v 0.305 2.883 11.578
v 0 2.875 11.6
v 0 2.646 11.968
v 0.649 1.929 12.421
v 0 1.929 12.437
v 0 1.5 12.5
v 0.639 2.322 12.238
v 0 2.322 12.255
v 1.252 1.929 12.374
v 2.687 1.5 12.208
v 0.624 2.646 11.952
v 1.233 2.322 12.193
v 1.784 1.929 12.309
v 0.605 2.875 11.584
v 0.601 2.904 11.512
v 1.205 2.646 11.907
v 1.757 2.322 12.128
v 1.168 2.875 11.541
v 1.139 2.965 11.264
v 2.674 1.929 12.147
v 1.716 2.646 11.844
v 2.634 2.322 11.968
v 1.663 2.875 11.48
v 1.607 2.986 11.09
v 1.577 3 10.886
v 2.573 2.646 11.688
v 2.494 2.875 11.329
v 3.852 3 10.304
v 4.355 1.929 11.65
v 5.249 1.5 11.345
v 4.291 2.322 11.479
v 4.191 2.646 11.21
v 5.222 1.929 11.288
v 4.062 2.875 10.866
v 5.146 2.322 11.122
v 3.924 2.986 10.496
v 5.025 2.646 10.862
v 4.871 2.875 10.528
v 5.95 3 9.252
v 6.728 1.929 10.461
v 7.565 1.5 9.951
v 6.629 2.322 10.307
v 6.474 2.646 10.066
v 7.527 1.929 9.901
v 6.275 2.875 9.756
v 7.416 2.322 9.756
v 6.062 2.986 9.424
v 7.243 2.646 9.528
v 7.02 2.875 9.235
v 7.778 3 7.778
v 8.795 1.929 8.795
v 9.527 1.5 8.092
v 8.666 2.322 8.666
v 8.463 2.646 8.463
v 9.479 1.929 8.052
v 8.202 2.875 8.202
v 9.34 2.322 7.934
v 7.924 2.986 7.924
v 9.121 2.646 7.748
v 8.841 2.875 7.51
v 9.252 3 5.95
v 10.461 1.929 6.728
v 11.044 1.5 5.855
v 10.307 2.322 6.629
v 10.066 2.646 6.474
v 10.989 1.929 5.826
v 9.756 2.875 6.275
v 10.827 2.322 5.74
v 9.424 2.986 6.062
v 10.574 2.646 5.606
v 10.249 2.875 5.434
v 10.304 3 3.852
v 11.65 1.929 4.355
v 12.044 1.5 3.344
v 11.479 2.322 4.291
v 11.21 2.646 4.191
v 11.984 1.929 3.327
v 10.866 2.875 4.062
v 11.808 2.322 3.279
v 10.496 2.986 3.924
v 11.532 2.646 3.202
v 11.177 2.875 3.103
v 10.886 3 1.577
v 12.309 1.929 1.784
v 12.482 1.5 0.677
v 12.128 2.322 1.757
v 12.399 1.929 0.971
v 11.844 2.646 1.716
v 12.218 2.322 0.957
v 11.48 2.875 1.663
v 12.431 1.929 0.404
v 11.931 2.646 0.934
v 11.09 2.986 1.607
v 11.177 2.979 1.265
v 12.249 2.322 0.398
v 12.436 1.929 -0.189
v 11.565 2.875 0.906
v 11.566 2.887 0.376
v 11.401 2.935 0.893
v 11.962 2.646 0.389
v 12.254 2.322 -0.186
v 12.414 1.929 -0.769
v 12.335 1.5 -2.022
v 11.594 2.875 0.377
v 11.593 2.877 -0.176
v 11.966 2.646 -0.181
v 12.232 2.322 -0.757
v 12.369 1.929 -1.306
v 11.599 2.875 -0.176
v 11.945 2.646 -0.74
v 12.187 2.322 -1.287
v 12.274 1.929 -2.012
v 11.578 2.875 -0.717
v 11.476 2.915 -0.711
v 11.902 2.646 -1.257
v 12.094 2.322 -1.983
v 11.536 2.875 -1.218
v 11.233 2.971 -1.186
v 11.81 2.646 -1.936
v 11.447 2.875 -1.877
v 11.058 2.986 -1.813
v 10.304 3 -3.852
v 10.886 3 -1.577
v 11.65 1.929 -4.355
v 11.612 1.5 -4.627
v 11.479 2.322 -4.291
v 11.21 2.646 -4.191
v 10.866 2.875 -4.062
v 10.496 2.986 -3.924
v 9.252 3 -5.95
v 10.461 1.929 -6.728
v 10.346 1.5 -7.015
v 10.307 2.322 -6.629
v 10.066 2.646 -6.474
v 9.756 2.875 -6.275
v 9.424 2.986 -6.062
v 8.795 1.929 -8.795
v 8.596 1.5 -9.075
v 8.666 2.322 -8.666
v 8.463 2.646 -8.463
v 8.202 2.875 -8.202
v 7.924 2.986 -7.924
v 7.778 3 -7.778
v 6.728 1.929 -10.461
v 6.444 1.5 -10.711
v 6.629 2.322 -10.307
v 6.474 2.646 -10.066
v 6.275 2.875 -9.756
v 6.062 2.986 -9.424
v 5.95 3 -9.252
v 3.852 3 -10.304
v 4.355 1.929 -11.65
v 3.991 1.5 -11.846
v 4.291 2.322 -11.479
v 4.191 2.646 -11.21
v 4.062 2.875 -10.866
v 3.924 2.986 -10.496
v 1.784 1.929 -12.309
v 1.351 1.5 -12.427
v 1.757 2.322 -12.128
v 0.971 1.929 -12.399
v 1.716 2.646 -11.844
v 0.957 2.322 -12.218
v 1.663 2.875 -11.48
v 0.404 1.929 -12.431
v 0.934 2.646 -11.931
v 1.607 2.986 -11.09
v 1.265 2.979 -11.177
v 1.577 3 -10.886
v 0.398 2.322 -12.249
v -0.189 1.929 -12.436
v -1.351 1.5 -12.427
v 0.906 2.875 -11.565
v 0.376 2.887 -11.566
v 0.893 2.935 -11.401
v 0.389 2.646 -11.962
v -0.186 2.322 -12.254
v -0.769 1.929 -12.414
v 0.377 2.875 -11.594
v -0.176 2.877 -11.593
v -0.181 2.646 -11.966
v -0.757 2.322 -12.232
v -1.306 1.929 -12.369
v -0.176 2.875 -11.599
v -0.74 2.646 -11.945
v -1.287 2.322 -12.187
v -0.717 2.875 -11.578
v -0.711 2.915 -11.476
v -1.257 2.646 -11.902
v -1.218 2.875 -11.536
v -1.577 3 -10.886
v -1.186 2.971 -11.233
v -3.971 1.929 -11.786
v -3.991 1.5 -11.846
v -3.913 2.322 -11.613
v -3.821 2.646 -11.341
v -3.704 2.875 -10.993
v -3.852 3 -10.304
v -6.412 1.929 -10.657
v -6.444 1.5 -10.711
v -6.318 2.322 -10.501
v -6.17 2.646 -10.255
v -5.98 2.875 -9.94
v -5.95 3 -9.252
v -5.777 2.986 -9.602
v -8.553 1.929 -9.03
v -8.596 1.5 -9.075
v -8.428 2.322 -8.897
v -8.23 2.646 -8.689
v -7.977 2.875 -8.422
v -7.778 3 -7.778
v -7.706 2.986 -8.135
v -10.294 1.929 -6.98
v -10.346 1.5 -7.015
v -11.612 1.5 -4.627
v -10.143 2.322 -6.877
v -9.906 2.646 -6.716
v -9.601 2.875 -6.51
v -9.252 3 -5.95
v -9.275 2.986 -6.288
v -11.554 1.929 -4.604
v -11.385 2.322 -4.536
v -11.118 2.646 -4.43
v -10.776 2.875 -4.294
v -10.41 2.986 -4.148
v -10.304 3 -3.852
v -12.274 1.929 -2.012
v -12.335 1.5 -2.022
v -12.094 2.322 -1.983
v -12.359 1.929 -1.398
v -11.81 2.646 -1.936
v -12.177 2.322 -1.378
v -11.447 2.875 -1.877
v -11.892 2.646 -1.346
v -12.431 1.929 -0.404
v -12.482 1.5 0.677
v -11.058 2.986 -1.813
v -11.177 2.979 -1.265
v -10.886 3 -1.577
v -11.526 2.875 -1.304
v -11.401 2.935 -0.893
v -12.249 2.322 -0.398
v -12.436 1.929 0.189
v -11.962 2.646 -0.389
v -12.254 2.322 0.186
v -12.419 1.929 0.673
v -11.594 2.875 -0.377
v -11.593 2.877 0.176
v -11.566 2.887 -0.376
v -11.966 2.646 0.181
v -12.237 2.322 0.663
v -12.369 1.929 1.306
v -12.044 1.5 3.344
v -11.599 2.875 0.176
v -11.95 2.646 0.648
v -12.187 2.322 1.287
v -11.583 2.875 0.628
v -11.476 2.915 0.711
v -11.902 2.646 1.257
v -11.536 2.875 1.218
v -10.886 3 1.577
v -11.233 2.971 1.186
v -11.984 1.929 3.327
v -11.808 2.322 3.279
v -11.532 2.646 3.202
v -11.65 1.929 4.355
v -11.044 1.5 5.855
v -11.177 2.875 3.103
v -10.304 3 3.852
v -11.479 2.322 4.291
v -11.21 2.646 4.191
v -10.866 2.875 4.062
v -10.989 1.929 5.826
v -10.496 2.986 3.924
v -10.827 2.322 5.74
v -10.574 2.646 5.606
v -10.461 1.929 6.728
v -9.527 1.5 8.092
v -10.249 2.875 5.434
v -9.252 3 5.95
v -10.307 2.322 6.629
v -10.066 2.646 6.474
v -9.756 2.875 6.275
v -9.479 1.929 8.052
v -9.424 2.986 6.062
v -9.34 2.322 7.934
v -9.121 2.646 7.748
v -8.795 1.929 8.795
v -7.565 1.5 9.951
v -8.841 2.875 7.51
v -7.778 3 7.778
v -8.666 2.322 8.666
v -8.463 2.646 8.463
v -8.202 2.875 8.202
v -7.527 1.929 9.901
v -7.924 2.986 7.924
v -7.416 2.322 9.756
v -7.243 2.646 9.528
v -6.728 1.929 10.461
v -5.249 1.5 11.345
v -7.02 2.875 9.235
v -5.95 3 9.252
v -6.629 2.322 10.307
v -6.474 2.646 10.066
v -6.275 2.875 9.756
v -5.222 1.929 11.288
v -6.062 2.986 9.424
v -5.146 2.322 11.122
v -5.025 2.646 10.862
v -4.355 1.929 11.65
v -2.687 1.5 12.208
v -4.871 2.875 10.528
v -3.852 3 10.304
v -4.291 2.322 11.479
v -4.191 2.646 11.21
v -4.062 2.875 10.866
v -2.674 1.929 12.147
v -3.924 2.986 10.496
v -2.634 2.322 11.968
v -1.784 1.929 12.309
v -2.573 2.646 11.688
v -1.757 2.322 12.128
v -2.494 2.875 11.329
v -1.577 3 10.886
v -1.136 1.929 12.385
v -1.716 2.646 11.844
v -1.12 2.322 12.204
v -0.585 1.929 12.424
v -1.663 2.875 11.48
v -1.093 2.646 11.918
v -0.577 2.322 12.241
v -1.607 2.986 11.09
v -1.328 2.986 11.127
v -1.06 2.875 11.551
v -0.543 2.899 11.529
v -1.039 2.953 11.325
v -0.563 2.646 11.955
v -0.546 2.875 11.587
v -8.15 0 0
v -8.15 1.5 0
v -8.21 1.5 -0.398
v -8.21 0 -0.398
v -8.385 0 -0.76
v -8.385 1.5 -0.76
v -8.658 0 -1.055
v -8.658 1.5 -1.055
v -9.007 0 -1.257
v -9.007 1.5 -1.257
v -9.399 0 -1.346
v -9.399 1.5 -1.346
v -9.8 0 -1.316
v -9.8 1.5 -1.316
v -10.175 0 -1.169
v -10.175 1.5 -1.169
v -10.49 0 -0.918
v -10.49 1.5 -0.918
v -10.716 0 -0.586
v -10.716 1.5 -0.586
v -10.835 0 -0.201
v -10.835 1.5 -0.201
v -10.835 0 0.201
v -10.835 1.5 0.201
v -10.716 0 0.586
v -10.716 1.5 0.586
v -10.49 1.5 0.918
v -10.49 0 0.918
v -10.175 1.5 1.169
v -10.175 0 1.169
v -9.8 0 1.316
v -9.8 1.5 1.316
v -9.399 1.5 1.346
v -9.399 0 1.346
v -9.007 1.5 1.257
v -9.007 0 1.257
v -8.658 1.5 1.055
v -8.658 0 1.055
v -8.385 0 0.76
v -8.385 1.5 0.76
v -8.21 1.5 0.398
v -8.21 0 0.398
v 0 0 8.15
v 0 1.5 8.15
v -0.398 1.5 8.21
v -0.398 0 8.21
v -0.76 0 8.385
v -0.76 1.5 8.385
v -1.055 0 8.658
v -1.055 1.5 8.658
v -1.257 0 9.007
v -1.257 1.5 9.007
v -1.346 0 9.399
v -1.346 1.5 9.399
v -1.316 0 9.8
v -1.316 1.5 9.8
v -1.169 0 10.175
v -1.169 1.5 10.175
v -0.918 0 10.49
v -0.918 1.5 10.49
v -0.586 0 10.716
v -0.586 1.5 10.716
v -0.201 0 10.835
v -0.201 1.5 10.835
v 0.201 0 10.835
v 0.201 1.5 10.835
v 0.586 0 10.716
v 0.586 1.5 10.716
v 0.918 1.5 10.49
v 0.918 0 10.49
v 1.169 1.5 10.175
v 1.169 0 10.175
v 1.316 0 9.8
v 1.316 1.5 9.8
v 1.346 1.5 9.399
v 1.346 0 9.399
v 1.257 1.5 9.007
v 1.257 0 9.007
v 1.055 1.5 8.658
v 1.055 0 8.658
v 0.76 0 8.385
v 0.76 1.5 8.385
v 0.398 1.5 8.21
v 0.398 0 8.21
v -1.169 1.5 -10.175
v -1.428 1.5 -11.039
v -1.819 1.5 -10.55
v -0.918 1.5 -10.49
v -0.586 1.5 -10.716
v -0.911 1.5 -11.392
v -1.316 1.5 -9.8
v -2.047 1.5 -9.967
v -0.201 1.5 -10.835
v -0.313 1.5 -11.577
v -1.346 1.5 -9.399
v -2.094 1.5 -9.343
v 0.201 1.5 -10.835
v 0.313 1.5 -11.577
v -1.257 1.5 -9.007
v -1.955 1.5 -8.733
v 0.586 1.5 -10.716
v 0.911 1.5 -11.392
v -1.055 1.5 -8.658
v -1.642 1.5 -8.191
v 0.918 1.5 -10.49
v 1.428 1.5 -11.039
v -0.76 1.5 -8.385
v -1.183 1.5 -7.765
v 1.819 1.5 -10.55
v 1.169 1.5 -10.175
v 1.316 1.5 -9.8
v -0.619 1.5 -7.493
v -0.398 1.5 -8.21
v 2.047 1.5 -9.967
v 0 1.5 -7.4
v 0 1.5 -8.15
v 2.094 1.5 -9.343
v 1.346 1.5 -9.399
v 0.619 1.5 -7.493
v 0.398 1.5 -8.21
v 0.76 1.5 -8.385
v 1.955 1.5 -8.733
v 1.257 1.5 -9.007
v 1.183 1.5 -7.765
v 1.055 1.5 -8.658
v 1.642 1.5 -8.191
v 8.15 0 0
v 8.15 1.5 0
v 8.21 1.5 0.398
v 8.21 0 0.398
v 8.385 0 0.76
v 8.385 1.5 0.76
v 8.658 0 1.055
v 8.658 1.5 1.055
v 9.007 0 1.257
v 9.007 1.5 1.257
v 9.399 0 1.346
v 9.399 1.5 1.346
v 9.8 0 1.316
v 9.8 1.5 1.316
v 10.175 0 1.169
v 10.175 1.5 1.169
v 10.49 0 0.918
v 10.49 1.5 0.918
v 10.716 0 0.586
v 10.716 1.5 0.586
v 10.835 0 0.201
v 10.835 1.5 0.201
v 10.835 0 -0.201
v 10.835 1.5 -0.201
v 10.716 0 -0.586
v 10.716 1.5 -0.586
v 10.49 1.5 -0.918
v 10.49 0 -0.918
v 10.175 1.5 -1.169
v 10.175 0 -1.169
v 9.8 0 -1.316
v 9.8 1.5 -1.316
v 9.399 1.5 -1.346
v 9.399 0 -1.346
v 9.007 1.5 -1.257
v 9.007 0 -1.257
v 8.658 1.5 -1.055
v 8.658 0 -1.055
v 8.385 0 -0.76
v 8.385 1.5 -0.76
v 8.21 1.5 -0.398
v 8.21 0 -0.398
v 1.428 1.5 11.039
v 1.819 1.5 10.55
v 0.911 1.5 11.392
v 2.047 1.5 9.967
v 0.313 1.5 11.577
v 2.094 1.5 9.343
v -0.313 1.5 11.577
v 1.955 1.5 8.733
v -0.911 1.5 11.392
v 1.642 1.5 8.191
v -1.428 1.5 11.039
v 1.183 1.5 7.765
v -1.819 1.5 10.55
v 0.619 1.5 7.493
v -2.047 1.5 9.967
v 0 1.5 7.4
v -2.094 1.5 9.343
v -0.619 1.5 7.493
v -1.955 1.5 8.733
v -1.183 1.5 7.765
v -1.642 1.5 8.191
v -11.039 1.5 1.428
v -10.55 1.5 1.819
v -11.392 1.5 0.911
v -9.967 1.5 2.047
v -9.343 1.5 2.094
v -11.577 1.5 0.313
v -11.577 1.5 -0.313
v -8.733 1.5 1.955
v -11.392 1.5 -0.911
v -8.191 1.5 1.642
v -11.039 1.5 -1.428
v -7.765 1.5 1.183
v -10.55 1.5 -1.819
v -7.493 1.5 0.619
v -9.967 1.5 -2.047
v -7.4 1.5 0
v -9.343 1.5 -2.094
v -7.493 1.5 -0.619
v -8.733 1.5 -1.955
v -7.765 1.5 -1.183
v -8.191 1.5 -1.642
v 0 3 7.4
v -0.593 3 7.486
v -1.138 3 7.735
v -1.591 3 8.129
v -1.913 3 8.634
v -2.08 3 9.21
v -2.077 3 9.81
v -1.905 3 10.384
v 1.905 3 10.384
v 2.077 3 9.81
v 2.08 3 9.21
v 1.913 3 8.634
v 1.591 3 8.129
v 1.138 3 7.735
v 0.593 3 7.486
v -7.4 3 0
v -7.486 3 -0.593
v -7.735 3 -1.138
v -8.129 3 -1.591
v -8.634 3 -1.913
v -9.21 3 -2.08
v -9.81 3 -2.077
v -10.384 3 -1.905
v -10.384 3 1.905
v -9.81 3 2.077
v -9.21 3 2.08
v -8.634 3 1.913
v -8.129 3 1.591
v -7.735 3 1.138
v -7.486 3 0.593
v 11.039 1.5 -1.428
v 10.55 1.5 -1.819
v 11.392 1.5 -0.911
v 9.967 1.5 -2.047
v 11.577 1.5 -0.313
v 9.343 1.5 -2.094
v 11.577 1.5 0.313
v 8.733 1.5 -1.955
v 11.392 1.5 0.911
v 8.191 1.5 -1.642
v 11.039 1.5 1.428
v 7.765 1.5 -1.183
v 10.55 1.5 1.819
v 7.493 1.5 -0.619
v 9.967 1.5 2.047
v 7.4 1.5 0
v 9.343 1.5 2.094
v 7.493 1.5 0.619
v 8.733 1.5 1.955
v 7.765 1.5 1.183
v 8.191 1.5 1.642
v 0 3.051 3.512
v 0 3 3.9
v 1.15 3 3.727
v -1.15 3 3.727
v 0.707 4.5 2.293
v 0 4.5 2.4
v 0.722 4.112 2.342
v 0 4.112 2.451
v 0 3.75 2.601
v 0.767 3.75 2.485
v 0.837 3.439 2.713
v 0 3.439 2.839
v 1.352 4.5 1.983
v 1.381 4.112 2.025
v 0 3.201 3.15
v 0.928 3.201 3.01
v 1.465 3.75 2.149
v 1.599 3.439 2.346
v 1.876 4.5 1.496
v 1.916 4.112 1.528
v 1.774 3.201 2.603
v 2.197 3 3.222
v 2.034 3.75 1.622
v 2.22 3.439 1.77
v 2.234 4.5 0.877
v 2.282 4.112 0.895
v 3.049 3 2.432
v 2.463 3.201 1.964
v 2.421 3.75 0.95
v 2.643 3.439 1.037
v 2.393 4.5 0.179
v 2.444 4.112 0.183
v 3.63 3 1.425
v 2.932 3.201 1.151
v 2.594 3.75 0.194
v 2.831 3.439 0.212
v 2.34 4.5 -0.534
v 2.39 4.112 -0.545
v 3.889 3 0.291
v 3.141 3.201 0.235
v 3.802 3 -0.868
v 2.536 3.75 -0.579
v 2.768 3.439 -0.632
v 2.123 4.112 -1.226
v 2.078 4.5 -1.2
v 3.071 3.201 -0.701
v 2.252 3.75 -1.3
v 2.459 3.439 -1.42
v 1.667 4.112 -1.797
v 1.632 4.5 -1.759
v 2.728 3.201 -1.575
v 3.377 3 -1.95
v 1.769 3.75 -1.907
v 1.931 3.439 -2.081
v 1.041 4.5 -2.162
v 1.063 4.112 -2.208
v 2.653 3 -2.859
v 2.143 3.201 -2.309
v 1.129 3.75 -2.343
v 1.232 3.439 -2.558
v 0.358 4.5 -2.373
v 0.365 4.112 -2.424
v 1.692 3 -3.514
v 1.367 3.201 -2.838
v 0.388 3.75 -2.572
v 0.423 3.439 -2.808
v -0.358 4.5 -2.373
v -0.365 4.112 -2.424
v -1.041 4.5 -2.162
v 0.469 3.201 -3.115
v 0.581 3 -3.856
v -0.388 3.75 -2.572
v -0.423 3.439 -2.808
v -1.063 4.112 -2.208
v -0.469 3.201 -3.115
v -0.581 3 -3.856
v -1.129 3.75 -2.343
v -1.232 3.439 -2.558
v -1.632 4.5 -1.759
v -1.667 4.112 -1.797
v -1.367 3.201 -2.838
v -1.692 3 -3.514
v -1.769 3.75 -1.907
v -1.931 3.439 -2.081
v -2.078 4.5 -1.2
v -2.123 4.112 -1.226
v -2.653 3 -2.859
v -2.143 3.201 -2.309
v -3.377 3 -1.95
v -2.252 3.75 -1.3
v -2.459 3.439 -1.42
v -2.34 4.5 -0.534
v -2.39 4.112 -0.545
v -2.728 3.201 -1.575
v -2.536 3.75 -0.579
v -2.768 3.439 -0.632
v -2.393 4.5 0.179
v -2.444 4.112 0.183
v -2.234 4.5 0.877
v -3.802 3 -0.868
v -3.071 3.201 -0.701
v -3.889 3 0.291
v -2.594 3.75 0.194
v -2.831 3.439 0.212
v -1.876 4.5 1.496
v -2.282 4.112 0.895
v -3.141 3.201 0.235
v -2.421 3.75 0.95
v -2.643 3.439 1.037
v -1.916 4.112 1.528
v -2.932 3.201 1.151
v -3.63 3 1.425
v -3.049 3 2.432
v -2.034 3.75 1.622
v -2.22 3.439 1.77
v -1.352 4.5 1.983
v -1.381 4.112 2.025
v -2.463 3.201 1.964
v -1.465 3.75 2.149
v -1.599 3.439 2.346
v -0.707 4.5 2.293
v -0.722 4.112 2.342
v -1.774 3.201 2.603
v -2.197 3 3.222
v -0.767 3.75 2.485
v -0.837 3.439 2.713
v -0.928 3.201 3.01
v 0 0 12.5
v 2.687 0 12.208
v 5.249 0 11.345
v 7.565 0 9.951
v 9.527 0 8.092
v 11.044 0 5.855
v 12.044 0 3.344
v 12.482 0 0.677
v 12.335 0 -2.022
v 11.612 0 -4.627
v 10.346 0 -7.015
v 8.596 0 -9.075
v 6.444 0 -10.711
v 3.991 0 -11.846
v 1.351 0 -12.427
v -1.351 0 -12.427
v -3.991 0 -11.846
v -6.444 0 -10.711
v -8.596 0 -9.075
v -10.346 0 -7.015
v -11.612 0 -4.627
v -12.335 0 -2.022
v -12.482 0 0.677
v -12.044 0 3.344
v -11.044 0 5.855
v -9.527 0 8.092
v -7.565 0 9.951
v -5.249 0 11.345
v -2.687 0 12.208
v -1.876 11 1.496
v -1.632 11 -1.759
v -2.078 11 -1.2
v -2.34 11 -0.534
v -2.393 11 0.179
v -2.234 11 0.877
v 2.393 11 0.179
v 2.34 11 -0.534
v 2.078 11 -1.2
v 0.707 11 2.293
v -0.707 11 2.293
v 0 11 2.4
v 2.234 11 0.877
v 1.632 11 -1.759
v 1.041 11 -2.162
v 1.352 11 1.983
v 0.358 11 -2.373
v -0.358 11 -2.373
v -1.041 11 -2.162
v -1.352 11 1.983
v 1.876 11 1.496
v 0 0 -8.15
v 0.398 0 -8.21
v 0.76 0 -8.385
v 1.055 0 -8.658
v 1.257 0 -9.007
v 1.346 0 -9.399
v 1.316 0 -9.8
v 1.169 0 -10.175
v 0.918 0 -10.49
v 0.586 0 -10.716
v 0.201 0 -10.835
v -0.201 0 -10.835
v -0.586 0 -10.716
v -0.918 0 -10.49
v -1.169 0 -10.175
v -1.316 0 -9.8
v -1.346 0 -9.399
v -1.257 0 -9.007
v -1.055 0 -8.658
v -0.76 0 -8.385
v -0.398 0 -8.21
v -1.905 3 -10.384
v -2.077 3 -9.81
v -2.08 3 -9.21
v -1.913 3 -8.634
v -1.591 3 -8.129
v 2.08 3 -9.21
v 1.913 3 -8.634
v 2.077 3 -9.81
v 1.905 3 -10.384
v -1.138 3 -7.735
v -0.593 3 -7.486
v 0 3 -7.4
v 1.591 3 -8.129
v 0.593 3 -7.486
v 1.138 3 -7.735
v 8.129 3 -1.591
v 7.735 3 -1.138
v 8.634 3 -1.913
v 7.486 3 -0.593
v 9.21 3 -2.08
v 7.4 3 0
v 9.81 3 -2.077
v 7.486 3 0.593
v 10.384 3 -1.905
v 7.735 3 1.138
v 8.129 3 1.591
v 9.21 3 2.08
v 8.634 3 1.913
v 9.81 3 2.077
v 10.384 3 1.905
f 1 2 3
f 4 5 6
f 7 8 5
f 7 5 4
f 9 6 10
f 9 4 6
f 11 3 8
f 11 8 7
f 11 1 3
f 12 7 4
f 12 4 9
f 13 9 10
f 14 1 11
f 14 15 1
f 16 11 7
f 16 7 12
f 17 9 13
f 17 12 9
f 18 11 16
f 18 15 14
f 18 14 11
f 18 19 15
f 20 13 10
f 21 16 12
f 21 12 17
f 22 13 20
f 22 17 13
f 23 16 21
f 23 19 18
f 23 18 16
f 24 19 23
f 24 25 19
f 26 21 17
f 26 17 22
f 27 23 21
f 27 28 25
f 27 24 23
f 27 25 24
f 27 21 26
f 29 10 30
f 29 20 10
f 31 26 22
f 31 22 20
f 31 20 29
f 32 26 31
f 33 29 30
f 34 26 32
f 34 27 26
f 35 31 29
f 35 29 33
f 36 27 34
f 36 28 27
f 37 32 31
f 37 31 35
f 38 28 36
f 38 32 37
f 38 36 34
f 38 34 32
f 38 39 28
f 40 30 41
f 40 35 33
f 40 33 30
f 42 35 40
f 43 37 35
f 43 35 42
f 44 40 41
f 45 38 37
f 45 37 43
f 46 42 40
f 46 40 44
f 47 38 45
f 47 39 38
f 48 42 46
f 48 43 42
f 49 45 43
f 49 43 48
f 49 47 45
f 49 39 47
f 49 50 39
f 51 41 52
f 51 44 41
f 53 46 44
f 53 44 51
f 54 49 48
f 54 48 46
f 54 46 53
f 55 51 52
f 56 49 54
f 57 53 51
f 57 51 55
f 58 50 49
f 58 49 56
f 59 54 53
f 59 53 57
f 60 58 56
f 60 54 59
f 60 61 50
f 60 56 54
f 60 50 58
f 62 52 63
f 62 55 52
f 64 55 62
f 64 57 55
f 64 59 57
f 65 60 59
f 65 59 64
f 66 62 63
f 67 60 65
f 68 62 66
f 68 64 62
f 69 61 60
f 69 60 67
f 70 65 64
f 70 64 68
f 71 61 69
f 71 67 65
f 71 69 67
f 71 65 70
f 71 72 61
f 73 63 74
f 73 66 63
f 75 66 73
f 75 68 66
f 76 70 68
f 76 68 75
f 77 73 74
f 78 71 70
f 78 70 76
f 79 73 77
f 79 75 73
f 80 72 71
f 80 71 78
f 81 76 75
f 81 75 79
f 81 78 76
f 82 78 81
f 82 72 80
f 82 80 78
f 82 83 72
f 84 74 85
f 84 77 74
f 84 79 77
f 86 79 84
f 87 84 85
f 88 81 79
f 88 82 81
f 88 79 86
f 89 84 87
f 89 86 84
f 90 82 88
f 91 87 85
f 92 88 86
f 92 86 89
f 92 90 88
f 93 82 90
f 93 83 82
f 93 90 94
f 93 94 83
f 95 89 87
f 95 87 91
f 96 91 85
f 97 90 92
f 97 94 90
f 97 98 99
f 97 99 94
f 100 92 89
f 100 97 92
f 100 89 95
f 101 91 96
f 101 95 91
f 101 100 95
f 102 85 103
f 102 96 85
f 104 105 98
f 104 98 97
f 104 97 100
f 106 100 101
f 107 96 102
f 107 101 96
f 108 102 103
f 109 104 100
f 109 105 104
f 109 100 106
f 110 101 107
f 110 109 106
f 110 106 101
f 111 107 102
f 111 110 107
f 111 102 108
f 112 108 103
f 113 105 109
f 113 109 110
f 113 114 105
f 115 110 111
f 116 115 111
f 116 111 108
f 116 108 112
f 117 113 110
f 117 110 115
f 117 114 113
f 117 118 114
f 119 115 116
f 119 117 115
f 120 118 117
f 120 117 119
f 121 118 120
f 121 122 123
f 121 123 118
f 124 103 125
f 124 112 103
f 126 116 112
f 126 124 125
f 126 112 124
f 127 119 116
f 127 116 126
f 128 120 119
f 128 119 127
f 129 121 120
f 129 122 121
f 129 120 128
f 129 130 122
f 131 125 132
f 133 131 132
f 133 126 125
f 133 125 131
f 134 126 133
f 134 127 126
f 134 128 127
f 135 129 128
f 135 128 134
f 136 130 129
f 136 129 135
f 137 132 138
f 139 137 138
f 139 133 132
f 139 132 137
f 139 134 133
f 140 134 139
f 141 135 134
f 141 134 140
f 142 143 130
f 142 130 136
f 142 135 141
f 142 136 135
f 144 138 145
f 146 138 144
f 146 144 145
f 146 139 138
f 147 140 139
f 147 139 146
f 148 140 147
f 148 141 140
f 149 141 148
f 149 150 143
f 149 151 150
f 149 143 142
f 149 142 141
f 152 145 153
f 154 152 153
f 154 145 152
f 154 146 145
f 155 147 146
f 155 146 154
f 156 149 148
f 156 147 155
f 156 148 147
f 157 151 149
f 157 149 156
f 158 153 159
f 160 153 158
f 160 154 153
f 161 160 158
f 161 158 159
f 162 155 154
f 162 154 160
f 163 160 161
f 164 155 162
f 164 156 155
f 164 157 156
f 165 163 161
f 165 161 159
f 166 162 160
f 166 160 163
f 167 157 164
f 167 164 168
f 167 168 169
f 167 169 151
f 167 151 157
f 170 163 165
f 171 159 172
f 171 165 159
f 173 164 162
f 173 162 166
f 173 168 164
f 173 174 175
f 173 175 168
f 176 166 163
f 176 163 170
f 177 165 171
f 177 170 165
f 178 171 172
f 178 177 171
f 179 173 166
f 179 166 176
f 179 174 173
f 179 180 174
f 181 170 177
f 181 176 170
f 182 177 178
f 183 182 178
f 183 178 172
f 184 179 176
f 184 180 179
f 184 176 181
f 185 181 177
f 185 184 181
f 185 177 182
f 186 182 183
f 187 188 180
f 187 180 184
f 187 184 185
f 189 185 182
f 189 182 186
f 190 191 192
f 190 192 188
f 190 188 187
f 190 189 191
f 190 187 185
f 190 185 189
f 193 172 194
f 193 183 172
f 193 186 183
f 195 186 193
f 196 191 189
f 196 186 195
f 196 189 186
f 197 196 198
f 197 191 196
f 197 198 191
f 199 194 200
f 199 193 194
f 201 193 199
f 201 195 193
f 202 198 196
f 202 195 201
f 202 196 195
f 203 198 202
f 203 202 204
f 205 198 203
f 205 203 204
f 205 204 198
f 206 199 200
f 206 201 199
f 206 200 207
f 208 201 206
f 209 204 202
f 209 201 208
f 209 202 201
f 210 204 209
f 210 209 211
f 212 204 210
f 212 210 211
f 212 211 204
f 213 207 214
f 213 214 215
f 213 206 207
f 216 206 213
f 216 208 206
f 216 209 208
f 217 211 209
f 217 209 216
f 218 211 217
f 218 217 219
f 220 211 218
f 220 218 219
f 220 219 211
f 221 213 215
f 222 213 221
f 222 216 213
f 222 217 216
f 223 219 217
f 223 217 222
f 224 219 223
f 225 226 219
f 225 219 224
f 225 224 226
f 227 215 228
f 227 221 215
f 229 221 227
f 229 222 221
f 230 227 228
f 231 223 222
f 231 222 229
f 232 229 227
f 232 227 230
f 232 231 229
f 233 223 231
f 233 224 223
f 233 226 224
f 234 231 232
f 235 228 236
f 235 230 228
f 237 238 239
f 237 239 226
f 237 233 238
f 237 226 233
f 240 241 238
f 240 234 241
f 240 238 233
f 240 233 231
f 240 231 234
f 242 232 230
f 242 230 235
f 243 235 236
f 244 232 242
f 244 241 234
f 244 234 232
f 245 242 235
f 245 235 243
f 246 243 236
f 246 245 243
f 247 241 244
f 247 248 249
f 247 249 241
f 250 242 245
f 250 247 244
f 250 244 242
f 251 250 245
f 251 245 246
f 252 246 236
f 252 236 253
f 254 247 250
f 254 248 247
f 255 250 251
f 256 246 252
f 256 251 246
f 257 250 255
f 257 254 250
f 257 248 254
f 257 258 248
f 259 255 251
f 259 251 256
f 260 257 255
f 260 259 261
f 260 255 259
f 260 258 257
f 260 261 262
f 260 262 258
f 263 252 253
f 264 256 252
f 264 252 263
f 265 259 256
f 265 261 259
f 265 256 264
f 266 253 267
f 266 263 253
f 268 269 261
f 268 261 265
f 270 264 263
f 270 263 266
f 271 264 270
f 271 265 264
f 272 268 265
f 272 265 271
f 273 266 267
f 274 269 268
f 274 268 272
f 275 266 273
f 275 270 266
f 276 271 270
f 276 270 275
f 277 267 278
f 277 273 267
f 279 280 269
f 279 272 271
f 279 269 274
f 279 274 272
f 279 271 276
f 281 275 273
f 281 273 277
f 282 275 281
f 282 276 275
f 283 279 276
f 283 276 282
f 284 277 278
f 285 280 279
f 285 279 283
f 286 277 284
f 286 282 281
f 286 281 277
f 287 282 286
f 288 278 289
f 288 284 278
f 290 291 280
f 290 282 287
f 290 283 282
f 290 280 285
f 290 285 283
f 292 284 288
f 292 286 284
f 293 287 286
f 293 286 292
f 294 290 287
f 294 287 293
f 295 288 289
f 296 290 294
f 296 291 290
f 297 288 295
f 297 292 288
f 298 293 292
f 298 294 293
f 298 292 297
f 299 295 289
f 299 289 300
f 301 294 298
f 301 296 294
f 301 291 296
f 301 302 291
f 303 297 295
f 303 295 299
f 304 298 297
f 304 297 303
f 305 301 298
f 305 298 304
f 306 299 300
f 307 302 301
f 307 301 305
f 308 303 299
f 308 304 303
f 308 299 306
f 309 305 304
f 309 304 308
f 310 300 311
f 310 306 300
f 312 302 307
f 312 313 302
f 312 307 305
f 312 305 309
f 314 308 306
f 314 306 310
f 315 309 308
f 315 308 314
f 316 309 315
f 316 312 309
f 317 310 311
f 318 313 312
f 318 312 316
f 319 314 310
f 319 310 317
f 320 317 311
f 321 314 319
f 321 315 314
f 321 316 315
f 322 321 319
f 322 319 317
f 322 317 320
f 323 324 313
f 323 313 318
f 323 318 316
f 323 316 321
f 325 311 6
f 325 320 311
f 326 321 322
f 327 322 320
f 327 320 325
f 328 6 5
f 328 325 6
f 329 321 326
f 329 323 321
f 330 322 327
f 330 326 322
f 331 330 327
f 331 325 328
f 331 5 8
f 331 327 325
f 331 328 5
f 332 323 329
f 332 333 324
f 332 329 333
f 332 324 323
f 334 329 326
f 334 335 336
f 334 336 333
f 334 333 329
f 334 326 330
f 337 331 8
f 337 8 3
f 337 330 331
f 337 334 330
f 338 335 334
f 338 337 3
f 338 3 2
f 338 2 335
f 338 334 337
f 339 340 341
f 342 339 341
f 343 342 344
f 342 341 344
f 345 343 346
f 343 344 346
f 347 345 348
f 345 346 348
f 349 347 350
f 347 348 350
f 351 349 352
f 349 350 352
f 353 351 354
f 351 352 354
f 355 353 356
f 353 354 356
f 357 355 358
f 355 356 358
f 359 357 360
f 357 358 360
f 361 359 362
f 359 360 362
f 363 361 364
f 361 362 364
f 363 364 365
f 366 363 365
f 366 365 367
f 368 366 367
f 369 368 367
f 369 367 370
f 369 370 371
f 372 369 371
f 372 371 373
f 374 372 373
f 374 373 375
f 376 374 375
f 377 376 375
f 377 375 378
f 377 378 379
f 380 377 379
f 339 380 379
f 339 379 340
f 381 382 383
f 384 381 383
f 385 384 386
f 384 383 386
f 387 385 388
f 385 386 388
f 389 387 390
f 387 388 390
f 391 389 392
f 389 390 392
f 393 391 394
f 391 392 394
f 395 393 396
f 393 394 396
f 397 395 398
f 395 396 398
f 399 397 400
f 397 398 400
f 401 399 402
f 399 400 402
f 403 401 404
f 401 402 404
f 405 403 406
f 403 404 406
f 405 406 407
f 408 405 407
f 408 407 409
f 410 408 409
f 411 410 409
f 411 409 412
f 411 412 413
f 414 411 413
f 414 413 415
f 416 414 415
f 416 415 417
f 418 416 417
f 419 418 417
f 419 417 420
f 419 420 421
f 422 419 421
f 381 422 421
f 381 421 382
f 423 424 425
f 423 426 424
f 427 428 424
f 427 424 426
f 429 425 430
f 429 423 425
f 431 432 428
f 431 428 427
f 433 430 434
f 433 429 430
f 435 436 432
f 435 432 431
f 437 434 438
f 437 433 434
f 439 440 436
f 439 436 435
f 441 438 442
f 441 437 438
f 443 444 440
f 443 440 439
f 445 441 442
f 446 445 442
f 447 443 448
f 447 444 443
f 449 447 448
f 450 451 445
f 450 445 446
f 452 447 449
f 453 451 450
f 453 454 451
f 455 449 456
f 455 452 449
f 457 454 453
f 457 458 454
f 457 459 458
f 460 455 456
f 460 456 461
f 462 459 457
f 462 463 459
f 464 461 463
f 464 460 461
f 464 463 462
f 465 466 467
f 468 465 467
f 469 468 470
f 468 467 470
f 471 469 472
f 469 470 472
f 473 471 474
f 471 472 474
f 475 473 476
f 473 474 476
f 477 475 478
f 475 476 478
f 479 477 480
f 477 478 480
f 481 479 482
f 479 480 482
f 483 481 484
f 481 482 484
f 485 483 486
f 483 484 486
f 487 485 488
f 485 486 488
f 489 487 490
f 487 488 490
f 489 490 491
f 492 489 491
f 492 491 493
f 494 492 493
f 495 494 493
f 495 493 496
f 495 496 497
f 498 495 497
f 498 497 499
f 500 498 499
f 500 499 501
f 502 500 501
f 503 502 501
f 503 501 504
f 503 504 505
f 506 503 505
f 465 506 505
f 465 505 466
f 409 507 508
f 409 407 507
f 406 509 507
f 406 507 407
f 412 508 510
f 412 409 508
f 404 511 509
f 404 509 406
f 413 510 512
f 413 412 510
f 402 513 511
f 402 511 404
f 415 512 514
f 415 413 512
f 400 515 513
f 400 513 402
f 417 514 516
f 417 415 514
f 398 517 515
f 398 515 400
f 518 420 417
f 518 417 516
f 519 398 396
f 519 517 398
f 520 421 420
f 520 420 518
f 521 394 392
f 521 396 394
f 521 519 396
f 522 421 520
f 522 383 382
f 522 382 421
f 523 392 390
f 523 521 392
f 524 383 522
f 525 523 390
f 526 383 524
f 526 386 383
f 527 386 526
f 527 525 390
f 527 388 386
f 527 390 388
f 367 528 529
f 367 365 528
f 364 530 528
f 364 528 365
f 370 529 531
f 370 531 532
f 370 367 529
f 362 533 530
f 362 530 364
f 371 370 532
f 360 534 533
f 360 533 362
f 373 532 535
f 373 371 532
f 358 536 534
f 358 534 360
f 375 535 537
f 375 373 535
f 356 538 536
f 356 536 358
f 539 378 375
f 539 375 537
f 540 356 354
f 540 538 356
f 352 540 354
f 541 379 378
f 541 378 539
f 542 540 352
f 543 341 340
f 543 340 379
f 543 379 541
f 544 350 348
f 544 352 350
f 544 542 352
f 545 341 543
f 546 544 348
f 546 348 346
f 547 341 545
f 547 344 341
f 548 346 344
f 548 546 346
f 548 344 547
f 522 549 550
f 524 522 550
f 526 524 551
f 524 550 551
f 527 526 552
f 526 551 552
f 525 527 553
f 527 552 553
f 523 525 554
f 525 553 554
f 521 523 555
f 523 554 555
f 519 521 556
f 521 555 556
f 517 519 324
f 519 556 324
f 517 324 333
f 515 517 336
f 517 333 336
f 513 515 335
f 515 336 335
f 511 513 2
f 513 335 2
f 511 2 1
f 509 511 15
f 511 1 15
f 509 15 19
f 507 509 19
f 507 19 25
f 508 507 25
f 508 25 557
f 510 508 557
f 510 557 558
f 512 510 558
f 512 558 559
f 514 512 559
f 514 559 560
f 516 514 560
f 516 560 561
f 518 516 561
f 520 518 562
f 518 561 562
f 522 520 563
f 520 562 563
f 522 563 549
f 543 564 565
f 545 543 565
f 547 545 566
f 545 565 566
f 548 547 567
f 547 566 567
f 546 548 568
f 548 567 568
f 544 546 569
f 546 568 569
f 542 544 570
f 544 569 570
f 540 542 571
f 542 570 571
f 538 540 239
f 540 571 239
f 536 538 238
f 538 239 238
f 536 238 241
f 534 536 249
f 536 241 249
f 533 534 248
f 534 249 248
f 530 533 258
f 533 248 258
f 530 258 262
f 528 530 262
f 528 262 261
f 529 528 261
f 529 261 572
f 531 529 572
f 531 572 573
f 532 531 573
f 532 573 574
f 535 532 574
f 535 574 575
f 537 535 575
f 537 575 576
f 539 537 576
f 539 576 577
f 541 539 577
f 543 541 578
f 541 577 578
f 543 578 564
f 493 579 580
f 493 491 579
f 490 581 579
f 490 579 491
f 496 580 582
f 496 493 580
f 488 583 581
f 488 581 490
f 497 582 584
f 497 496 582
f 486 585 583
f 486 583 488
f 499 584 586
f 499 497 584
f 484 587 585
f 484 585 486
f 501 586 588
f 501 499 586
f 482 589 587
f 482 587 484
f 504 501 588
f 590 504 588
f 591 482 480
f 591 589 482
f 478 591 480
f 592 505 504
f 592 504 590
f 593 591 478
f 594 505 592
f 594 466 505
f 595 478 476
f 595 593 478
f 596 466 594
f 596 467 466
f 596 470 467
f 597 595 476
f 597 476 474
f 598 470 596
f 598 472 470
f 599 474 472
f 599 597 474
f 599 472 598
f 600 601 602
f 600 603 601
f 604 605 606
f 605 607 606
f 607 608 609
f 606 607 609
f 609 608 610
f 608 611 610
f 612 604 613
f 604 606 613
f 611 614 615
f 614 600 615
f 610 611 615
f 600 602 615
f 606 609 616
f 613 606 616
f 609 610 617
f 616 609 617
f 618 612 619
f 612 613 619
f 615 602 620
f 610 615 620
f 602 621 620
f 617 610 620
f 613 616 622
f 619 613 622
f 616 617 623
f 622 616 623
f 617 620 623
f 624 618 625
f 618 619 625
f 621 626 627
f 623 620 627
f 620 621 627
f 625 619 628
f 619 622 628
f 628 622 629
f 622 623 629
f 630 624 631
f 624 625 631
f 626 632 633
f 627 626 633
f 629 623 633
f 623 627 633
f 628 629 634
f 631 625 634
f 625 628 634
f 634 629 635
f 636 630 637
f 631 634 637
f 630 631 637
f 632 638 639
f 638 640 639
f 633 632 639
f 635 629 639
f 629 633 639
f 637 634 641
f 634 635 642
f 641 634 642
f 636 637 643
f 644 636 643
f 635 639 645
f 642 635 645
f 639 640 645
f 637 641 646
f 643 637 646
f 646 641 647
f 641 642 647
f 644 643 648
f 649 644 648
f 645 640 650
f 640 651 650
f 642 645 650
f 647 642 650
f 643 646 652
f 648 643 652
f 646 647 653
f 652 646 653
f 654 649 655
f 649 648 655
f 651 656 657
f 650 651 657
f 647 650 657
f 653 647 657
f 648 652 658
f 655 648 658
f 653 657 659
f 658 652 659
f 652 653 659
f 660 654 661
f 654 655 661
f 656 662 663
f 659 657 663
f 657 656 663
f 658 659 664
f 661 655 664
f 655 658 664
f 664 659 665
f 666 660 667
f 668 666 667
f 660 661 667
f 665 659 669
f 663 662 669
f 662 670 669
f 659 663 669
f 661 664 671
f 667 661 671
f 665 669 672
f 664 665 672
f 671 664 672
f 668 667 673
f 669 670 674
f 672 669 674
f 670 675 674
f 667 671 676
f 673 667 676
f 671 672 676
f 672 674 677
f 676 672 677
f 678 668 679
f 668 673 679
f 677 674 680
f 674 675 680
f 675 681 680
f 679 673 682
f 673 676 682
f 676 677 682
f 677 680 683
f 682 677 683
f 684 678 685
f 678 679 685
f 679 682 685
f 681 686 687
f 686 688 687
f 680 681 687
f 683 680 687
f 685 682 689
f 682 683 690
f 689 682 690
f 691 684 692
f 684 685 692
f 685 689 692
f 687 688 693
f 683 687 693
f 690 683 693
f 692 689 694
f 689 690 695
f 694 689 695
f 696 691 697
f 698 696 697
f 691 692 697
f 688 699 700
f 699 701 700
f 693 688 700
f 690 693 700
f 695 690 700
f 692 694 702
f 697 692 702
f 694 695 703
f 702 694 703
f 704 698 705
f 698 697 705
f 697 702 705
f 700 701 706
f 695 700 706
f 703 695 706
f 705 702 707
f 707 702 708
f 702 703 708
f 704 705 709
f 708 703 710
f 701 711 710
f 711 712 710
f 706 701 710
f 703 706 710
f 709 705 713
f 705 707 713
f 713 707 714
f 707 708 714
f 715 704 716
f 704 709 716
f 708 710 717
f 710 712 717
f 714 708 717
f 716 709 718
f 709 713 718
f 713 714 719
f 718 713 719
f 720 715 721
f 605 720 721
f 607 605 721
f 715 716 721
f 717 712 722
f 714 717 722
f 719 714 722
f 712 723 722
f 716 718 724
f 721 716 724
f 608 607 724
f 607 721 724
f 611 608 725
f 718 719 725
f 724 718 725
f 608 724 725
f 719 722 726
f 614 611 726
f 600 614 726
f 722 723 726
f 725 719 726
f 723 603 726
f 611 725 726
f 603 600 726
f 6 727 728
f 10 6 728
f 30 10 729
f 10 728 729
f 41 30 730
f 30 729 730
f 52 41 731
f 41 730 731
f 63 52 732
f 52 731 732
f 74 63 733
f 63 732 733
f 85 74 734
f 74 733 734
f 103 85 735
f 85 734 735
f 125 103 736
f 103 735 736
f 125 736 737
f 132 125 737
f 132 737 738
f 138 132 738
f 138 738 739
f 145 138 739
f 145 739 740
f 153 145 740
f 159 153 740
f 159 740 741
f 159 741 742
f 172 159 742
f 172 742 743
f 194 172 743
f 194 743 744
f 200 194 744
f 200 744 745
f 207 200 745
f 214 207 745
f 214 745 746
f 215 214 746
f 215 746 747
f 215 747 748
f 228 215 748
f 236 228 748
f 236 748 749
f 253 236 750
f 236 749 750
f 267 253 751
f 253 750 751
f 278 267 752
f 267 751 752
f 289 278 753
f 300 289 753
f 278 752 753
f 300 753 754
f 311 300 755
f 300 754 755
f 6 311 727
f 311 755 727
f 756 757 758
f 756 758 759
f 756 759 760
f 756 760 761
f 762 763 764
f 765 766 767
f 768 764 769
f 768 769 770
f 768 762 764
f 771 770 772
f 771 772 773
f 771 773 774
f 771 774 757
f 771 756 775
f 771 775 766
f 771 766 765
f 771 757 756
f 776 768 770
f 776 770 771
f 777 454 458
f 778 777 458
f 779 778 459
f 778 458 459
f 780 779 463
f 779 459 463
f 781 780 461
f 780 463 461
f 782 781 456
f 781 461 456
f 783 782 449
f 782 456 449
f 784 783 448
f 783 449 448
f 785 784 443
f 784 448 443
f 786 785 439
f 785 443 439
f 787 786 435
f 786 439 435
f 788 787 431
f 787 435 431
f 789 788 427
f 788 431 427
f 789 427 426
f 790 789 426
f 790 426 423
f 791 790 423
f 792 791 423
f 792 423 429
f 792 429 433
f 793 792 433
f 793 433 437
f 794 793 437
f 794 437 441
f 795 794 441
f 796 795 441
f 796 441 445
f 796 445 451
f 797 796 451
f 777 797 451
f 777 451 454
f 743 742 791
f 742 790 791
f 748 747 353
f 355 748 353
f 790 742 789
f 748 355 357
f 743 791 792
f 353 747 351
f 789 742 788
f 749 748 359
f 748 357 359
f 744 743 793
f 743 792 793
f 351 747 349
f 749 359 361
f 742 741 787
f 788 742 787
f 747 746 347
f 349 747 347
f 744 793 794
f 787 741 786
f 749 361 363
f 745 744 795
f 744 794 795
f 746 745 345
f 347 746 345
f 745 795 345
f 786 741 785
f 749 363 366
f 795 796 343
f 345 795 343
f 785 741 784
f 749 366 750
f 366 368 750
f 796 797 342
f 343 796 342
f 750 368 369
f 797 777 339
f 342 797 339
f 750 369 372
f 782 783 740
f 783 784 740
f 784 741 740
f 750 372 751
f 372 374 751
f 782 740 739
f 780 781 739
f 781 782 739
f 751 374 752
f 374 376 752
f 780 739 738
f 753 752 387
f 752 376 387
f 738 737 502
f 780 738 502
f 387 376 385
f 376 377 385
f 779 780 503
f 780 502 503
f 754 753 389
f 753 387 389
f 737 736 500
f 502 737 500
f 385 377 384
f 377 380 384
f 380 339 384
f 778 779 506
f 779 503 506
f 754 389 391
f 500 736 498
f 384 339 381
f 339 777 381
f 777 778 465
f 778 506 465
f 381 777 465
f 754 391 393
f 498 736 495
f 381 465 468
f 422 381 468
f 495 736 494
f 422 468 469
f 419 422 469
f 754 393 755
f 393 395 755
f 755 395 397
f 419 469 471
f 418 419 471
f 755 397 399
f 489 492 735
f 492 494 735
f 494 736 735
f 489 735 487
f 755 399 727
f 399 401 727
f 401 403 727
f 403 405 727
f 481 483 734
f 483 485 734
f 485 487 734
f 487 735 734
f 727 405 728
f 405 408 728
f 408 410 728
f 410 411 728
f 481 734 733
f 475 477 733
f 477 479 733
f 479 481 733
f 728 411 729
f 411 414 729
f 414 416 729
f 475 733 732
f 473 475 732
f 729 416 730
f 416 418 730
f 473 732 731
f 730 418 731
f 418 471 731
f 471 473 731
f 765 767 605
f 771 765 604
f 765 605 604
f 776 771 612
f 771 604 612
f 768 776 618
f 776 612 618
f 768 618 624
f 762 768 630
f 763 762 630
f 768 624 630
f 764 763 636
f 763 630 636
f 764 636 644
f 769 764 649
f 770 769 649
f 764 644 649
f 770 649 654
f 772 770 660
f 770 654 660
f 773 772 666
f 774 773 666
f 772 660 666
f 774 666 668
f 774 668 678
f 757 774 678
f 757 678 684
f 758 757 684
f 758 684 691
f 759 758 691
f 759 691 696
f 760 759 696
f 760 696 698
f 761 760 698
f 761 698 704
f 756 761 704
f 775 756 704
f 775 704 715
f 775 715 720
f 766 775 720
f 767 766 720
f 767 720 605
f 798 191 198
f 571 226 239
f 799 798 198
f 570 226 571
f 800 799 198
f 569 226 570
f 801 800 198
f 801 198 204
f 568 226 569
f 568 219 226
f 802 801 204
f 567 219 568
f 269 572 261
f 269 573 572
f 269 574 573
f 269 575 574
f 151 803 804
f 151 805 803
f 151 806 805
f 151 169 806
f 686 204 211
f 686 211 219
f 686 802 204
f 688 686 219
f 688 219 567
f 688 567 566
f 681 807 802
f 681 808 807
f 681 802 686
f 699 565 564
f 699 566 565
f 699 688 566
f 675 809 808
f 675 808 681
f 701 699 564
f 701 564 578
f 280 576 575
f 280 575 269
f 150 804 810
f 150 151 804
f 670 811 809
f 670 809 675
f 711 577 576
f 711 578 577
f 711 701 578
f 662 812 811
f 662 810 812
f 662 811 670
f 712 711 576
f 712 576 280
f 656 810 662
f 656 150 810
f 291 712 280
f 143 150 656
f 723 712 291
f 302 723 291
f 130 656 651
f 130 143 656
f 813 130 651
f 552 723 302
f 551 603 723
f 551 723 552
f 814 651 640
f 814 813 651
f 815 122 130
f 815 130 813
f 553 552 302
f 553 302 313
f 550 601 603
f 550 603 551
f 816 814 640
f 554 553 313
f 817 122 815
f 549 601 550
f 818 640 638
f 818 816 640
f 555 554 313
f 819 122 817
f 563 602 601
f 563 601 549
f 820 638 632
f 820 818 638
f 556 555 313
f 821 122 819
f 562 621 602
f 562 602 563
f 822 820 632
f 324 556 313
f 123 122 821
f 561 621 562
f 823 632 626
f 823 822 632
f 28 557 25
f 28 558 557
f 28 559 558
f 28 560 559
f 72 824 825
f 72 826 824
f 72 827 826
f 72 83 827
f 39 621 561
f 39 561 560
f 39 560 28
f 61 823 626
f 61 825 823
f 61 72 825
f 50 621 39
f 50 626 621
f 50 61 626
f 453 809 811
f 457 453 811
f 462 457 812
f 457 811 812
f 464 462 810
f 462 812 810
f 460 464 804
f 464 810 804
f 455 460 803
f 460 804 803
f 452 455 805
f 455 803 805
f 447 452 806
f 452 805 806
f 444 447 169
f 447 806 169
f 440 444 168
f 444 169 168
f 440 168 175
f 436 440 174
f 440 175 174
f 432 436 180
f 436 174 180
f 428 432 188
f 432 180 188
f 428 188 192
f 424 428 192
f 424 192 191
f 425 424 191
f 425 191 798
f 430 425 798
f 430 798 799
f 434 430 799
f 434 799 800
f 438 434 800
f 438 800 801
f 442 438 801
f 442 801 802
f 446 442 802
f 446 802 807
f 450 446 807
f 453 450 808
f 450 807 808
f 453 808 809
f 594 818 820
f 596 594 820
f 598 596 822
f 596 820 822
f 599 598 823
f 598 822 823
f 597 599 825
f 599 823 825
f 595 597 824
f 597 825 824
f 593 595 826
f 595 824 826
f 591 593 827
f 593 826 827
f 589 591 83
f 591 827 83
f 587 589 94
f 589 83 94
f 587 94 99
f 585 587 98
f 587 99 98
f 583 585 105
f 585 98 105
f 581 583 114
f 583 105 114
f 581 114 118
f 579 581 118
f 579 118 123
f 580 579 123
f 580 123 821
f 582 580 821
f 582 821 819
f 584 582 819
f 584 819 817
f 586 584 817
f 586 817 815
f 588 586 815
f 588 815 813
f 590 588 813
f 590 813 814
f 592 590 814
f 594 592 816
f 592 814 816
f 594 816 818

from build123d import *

# Parameters (mm, degrees)
SKETCH1_R           = 12.5
BOSS_EXTRUDE1_DEPTH = 3
SKETCH2_R           = 1.35
CUT_EXTRUDE1_DEPTH  = 18.930421077
SKETCH4_R           = 2.1
CUT_EXTRUDE2_DEPTH  = 1.5
CIRPATTERN1_COUNT   = 4
SKETCH3_R           = 2.4
BOSS_EXTRUDE2_DEPTH = 8
FILLET1_R           = 1.5


with BuildPart() as part:
    # Sketch1 → Boss-Extrude1 (new body)
    with BuildSketch(Plane(origin=(0, 0, 0), x_dir=(1, 0, 0), z_dir=(0, 1, 0))):
        with Locations(Location((0, 0, 0), (0, 0, 270))):
            Circle(SKETCH1_R)
    extrude(amount=BOSS_EXTRUDE1_DEPTH)

    # Sketch2 → Cut-Extrude1 (cut, through all)
    with BuildSketch(Plane(origin=(0, 3, 0), x_dir=(1, 0, 0), z_dir=(0, 1, 0))):
        with Locations(Location((0, 9.5, 0), (0, 0, 270))):
            Circle(SKETCH2_R)
    cut_extrude1 = extrude(amount=-CUT_EXTRUDE1_DEPTH, mode=Mode.SUBTRACT)

    # Sketch4 → Cut-Extrude2 (cut)
    with BuildSketch(Plane(origin=(0, 3, 0), x_dir=(1, 0, 0), z_dir=(0, 1, 0))):
        with Locations(Location((0, 9.5, 0), (0, 0, 270))):
            Circle(SKETCH4_R)
    cut_extrude2 = extrude(amount=-CUT_EXTRUDE2_DEPTH, mode=Mode.SUBTRACT)

    # CirPattern1: Cut-Extrude1, Cut-Extrude2 ×4 about axis
    cirpattern1_axis = Axis((0, 0, 0), (0, 1, 0))
    add([cut_extrude1.rotate(cirpattern1_axis, i * 360 / CIRPATTERN1_COUNT) for i in range(1, CIRPATTERN1_COUNT)], mode=Mode.SUBTRACT)
    add([cut_extrude2.rotate(cirpattern1_axis, i * 360 / CIRPATTERN1_COUNT) for i in range(1, CIRPATTERN1_COUNT)], mode=Mode.SUBTRACT)

    # Sketch3 → Boss-Extrude2 (add)
    with BuildSketch(Plane(origin=(0, 3, 0), x_dir=(1, 0, 0), z_dir=(0, 1, 0))):
        with Locations(Location((0, 0, 0), (0, 0, 270))):
            Circle(SKETCH3_R)
    extrude(amount=BOSS_EXTRUDE2_DEPTH)

    # Fillet1
    # the kernel refuses this fillet: 1.5 mm, written as the material it adds along each edge
    with BuildSketch(Plane(origin=(0, 3, 0), x_dir=(0, 0, 1), z_dir=(-1, 0, 0))) as fillet1_piece_1:
        with BuildLine():
            CenterArc((2.4 + FILLET1_R, FILLET1_R), FILLET1_R, 180, 90)
            Line((2.4, FILLET1_R), (2.4, 0))
            Line((2.4, 0), (2.4 + FILLET1_R, 0))
        make_face()
    revolve(axis=Axis((0, 3, 0), (0, 1, 0)))
    # the kernel refuses this fillet: 1.5 mm, written as the material it takes off along each edge
    with BuildSketch(Plane(origin=(0, 3, 0), x_dir=(0, 0, 1), z_dir=(-1, 0, 0))) as fillet1_2_piece_1:
        with BuildLine():
            CenterArc((12.5 - FILLET1_R, -FILLET1_R), FILLET1_R, 0, 90)
            Line((12.5 - FILLET1_R, 0), (12.5, 0))
            Line((12.5, 0), (12.5, -FILLET1_R))
        make_face()
    revolve(axis=Axis((0, 3, 0), (0, 1, 0)), mode=Mode.SUBTRACT)


solid = part.part
